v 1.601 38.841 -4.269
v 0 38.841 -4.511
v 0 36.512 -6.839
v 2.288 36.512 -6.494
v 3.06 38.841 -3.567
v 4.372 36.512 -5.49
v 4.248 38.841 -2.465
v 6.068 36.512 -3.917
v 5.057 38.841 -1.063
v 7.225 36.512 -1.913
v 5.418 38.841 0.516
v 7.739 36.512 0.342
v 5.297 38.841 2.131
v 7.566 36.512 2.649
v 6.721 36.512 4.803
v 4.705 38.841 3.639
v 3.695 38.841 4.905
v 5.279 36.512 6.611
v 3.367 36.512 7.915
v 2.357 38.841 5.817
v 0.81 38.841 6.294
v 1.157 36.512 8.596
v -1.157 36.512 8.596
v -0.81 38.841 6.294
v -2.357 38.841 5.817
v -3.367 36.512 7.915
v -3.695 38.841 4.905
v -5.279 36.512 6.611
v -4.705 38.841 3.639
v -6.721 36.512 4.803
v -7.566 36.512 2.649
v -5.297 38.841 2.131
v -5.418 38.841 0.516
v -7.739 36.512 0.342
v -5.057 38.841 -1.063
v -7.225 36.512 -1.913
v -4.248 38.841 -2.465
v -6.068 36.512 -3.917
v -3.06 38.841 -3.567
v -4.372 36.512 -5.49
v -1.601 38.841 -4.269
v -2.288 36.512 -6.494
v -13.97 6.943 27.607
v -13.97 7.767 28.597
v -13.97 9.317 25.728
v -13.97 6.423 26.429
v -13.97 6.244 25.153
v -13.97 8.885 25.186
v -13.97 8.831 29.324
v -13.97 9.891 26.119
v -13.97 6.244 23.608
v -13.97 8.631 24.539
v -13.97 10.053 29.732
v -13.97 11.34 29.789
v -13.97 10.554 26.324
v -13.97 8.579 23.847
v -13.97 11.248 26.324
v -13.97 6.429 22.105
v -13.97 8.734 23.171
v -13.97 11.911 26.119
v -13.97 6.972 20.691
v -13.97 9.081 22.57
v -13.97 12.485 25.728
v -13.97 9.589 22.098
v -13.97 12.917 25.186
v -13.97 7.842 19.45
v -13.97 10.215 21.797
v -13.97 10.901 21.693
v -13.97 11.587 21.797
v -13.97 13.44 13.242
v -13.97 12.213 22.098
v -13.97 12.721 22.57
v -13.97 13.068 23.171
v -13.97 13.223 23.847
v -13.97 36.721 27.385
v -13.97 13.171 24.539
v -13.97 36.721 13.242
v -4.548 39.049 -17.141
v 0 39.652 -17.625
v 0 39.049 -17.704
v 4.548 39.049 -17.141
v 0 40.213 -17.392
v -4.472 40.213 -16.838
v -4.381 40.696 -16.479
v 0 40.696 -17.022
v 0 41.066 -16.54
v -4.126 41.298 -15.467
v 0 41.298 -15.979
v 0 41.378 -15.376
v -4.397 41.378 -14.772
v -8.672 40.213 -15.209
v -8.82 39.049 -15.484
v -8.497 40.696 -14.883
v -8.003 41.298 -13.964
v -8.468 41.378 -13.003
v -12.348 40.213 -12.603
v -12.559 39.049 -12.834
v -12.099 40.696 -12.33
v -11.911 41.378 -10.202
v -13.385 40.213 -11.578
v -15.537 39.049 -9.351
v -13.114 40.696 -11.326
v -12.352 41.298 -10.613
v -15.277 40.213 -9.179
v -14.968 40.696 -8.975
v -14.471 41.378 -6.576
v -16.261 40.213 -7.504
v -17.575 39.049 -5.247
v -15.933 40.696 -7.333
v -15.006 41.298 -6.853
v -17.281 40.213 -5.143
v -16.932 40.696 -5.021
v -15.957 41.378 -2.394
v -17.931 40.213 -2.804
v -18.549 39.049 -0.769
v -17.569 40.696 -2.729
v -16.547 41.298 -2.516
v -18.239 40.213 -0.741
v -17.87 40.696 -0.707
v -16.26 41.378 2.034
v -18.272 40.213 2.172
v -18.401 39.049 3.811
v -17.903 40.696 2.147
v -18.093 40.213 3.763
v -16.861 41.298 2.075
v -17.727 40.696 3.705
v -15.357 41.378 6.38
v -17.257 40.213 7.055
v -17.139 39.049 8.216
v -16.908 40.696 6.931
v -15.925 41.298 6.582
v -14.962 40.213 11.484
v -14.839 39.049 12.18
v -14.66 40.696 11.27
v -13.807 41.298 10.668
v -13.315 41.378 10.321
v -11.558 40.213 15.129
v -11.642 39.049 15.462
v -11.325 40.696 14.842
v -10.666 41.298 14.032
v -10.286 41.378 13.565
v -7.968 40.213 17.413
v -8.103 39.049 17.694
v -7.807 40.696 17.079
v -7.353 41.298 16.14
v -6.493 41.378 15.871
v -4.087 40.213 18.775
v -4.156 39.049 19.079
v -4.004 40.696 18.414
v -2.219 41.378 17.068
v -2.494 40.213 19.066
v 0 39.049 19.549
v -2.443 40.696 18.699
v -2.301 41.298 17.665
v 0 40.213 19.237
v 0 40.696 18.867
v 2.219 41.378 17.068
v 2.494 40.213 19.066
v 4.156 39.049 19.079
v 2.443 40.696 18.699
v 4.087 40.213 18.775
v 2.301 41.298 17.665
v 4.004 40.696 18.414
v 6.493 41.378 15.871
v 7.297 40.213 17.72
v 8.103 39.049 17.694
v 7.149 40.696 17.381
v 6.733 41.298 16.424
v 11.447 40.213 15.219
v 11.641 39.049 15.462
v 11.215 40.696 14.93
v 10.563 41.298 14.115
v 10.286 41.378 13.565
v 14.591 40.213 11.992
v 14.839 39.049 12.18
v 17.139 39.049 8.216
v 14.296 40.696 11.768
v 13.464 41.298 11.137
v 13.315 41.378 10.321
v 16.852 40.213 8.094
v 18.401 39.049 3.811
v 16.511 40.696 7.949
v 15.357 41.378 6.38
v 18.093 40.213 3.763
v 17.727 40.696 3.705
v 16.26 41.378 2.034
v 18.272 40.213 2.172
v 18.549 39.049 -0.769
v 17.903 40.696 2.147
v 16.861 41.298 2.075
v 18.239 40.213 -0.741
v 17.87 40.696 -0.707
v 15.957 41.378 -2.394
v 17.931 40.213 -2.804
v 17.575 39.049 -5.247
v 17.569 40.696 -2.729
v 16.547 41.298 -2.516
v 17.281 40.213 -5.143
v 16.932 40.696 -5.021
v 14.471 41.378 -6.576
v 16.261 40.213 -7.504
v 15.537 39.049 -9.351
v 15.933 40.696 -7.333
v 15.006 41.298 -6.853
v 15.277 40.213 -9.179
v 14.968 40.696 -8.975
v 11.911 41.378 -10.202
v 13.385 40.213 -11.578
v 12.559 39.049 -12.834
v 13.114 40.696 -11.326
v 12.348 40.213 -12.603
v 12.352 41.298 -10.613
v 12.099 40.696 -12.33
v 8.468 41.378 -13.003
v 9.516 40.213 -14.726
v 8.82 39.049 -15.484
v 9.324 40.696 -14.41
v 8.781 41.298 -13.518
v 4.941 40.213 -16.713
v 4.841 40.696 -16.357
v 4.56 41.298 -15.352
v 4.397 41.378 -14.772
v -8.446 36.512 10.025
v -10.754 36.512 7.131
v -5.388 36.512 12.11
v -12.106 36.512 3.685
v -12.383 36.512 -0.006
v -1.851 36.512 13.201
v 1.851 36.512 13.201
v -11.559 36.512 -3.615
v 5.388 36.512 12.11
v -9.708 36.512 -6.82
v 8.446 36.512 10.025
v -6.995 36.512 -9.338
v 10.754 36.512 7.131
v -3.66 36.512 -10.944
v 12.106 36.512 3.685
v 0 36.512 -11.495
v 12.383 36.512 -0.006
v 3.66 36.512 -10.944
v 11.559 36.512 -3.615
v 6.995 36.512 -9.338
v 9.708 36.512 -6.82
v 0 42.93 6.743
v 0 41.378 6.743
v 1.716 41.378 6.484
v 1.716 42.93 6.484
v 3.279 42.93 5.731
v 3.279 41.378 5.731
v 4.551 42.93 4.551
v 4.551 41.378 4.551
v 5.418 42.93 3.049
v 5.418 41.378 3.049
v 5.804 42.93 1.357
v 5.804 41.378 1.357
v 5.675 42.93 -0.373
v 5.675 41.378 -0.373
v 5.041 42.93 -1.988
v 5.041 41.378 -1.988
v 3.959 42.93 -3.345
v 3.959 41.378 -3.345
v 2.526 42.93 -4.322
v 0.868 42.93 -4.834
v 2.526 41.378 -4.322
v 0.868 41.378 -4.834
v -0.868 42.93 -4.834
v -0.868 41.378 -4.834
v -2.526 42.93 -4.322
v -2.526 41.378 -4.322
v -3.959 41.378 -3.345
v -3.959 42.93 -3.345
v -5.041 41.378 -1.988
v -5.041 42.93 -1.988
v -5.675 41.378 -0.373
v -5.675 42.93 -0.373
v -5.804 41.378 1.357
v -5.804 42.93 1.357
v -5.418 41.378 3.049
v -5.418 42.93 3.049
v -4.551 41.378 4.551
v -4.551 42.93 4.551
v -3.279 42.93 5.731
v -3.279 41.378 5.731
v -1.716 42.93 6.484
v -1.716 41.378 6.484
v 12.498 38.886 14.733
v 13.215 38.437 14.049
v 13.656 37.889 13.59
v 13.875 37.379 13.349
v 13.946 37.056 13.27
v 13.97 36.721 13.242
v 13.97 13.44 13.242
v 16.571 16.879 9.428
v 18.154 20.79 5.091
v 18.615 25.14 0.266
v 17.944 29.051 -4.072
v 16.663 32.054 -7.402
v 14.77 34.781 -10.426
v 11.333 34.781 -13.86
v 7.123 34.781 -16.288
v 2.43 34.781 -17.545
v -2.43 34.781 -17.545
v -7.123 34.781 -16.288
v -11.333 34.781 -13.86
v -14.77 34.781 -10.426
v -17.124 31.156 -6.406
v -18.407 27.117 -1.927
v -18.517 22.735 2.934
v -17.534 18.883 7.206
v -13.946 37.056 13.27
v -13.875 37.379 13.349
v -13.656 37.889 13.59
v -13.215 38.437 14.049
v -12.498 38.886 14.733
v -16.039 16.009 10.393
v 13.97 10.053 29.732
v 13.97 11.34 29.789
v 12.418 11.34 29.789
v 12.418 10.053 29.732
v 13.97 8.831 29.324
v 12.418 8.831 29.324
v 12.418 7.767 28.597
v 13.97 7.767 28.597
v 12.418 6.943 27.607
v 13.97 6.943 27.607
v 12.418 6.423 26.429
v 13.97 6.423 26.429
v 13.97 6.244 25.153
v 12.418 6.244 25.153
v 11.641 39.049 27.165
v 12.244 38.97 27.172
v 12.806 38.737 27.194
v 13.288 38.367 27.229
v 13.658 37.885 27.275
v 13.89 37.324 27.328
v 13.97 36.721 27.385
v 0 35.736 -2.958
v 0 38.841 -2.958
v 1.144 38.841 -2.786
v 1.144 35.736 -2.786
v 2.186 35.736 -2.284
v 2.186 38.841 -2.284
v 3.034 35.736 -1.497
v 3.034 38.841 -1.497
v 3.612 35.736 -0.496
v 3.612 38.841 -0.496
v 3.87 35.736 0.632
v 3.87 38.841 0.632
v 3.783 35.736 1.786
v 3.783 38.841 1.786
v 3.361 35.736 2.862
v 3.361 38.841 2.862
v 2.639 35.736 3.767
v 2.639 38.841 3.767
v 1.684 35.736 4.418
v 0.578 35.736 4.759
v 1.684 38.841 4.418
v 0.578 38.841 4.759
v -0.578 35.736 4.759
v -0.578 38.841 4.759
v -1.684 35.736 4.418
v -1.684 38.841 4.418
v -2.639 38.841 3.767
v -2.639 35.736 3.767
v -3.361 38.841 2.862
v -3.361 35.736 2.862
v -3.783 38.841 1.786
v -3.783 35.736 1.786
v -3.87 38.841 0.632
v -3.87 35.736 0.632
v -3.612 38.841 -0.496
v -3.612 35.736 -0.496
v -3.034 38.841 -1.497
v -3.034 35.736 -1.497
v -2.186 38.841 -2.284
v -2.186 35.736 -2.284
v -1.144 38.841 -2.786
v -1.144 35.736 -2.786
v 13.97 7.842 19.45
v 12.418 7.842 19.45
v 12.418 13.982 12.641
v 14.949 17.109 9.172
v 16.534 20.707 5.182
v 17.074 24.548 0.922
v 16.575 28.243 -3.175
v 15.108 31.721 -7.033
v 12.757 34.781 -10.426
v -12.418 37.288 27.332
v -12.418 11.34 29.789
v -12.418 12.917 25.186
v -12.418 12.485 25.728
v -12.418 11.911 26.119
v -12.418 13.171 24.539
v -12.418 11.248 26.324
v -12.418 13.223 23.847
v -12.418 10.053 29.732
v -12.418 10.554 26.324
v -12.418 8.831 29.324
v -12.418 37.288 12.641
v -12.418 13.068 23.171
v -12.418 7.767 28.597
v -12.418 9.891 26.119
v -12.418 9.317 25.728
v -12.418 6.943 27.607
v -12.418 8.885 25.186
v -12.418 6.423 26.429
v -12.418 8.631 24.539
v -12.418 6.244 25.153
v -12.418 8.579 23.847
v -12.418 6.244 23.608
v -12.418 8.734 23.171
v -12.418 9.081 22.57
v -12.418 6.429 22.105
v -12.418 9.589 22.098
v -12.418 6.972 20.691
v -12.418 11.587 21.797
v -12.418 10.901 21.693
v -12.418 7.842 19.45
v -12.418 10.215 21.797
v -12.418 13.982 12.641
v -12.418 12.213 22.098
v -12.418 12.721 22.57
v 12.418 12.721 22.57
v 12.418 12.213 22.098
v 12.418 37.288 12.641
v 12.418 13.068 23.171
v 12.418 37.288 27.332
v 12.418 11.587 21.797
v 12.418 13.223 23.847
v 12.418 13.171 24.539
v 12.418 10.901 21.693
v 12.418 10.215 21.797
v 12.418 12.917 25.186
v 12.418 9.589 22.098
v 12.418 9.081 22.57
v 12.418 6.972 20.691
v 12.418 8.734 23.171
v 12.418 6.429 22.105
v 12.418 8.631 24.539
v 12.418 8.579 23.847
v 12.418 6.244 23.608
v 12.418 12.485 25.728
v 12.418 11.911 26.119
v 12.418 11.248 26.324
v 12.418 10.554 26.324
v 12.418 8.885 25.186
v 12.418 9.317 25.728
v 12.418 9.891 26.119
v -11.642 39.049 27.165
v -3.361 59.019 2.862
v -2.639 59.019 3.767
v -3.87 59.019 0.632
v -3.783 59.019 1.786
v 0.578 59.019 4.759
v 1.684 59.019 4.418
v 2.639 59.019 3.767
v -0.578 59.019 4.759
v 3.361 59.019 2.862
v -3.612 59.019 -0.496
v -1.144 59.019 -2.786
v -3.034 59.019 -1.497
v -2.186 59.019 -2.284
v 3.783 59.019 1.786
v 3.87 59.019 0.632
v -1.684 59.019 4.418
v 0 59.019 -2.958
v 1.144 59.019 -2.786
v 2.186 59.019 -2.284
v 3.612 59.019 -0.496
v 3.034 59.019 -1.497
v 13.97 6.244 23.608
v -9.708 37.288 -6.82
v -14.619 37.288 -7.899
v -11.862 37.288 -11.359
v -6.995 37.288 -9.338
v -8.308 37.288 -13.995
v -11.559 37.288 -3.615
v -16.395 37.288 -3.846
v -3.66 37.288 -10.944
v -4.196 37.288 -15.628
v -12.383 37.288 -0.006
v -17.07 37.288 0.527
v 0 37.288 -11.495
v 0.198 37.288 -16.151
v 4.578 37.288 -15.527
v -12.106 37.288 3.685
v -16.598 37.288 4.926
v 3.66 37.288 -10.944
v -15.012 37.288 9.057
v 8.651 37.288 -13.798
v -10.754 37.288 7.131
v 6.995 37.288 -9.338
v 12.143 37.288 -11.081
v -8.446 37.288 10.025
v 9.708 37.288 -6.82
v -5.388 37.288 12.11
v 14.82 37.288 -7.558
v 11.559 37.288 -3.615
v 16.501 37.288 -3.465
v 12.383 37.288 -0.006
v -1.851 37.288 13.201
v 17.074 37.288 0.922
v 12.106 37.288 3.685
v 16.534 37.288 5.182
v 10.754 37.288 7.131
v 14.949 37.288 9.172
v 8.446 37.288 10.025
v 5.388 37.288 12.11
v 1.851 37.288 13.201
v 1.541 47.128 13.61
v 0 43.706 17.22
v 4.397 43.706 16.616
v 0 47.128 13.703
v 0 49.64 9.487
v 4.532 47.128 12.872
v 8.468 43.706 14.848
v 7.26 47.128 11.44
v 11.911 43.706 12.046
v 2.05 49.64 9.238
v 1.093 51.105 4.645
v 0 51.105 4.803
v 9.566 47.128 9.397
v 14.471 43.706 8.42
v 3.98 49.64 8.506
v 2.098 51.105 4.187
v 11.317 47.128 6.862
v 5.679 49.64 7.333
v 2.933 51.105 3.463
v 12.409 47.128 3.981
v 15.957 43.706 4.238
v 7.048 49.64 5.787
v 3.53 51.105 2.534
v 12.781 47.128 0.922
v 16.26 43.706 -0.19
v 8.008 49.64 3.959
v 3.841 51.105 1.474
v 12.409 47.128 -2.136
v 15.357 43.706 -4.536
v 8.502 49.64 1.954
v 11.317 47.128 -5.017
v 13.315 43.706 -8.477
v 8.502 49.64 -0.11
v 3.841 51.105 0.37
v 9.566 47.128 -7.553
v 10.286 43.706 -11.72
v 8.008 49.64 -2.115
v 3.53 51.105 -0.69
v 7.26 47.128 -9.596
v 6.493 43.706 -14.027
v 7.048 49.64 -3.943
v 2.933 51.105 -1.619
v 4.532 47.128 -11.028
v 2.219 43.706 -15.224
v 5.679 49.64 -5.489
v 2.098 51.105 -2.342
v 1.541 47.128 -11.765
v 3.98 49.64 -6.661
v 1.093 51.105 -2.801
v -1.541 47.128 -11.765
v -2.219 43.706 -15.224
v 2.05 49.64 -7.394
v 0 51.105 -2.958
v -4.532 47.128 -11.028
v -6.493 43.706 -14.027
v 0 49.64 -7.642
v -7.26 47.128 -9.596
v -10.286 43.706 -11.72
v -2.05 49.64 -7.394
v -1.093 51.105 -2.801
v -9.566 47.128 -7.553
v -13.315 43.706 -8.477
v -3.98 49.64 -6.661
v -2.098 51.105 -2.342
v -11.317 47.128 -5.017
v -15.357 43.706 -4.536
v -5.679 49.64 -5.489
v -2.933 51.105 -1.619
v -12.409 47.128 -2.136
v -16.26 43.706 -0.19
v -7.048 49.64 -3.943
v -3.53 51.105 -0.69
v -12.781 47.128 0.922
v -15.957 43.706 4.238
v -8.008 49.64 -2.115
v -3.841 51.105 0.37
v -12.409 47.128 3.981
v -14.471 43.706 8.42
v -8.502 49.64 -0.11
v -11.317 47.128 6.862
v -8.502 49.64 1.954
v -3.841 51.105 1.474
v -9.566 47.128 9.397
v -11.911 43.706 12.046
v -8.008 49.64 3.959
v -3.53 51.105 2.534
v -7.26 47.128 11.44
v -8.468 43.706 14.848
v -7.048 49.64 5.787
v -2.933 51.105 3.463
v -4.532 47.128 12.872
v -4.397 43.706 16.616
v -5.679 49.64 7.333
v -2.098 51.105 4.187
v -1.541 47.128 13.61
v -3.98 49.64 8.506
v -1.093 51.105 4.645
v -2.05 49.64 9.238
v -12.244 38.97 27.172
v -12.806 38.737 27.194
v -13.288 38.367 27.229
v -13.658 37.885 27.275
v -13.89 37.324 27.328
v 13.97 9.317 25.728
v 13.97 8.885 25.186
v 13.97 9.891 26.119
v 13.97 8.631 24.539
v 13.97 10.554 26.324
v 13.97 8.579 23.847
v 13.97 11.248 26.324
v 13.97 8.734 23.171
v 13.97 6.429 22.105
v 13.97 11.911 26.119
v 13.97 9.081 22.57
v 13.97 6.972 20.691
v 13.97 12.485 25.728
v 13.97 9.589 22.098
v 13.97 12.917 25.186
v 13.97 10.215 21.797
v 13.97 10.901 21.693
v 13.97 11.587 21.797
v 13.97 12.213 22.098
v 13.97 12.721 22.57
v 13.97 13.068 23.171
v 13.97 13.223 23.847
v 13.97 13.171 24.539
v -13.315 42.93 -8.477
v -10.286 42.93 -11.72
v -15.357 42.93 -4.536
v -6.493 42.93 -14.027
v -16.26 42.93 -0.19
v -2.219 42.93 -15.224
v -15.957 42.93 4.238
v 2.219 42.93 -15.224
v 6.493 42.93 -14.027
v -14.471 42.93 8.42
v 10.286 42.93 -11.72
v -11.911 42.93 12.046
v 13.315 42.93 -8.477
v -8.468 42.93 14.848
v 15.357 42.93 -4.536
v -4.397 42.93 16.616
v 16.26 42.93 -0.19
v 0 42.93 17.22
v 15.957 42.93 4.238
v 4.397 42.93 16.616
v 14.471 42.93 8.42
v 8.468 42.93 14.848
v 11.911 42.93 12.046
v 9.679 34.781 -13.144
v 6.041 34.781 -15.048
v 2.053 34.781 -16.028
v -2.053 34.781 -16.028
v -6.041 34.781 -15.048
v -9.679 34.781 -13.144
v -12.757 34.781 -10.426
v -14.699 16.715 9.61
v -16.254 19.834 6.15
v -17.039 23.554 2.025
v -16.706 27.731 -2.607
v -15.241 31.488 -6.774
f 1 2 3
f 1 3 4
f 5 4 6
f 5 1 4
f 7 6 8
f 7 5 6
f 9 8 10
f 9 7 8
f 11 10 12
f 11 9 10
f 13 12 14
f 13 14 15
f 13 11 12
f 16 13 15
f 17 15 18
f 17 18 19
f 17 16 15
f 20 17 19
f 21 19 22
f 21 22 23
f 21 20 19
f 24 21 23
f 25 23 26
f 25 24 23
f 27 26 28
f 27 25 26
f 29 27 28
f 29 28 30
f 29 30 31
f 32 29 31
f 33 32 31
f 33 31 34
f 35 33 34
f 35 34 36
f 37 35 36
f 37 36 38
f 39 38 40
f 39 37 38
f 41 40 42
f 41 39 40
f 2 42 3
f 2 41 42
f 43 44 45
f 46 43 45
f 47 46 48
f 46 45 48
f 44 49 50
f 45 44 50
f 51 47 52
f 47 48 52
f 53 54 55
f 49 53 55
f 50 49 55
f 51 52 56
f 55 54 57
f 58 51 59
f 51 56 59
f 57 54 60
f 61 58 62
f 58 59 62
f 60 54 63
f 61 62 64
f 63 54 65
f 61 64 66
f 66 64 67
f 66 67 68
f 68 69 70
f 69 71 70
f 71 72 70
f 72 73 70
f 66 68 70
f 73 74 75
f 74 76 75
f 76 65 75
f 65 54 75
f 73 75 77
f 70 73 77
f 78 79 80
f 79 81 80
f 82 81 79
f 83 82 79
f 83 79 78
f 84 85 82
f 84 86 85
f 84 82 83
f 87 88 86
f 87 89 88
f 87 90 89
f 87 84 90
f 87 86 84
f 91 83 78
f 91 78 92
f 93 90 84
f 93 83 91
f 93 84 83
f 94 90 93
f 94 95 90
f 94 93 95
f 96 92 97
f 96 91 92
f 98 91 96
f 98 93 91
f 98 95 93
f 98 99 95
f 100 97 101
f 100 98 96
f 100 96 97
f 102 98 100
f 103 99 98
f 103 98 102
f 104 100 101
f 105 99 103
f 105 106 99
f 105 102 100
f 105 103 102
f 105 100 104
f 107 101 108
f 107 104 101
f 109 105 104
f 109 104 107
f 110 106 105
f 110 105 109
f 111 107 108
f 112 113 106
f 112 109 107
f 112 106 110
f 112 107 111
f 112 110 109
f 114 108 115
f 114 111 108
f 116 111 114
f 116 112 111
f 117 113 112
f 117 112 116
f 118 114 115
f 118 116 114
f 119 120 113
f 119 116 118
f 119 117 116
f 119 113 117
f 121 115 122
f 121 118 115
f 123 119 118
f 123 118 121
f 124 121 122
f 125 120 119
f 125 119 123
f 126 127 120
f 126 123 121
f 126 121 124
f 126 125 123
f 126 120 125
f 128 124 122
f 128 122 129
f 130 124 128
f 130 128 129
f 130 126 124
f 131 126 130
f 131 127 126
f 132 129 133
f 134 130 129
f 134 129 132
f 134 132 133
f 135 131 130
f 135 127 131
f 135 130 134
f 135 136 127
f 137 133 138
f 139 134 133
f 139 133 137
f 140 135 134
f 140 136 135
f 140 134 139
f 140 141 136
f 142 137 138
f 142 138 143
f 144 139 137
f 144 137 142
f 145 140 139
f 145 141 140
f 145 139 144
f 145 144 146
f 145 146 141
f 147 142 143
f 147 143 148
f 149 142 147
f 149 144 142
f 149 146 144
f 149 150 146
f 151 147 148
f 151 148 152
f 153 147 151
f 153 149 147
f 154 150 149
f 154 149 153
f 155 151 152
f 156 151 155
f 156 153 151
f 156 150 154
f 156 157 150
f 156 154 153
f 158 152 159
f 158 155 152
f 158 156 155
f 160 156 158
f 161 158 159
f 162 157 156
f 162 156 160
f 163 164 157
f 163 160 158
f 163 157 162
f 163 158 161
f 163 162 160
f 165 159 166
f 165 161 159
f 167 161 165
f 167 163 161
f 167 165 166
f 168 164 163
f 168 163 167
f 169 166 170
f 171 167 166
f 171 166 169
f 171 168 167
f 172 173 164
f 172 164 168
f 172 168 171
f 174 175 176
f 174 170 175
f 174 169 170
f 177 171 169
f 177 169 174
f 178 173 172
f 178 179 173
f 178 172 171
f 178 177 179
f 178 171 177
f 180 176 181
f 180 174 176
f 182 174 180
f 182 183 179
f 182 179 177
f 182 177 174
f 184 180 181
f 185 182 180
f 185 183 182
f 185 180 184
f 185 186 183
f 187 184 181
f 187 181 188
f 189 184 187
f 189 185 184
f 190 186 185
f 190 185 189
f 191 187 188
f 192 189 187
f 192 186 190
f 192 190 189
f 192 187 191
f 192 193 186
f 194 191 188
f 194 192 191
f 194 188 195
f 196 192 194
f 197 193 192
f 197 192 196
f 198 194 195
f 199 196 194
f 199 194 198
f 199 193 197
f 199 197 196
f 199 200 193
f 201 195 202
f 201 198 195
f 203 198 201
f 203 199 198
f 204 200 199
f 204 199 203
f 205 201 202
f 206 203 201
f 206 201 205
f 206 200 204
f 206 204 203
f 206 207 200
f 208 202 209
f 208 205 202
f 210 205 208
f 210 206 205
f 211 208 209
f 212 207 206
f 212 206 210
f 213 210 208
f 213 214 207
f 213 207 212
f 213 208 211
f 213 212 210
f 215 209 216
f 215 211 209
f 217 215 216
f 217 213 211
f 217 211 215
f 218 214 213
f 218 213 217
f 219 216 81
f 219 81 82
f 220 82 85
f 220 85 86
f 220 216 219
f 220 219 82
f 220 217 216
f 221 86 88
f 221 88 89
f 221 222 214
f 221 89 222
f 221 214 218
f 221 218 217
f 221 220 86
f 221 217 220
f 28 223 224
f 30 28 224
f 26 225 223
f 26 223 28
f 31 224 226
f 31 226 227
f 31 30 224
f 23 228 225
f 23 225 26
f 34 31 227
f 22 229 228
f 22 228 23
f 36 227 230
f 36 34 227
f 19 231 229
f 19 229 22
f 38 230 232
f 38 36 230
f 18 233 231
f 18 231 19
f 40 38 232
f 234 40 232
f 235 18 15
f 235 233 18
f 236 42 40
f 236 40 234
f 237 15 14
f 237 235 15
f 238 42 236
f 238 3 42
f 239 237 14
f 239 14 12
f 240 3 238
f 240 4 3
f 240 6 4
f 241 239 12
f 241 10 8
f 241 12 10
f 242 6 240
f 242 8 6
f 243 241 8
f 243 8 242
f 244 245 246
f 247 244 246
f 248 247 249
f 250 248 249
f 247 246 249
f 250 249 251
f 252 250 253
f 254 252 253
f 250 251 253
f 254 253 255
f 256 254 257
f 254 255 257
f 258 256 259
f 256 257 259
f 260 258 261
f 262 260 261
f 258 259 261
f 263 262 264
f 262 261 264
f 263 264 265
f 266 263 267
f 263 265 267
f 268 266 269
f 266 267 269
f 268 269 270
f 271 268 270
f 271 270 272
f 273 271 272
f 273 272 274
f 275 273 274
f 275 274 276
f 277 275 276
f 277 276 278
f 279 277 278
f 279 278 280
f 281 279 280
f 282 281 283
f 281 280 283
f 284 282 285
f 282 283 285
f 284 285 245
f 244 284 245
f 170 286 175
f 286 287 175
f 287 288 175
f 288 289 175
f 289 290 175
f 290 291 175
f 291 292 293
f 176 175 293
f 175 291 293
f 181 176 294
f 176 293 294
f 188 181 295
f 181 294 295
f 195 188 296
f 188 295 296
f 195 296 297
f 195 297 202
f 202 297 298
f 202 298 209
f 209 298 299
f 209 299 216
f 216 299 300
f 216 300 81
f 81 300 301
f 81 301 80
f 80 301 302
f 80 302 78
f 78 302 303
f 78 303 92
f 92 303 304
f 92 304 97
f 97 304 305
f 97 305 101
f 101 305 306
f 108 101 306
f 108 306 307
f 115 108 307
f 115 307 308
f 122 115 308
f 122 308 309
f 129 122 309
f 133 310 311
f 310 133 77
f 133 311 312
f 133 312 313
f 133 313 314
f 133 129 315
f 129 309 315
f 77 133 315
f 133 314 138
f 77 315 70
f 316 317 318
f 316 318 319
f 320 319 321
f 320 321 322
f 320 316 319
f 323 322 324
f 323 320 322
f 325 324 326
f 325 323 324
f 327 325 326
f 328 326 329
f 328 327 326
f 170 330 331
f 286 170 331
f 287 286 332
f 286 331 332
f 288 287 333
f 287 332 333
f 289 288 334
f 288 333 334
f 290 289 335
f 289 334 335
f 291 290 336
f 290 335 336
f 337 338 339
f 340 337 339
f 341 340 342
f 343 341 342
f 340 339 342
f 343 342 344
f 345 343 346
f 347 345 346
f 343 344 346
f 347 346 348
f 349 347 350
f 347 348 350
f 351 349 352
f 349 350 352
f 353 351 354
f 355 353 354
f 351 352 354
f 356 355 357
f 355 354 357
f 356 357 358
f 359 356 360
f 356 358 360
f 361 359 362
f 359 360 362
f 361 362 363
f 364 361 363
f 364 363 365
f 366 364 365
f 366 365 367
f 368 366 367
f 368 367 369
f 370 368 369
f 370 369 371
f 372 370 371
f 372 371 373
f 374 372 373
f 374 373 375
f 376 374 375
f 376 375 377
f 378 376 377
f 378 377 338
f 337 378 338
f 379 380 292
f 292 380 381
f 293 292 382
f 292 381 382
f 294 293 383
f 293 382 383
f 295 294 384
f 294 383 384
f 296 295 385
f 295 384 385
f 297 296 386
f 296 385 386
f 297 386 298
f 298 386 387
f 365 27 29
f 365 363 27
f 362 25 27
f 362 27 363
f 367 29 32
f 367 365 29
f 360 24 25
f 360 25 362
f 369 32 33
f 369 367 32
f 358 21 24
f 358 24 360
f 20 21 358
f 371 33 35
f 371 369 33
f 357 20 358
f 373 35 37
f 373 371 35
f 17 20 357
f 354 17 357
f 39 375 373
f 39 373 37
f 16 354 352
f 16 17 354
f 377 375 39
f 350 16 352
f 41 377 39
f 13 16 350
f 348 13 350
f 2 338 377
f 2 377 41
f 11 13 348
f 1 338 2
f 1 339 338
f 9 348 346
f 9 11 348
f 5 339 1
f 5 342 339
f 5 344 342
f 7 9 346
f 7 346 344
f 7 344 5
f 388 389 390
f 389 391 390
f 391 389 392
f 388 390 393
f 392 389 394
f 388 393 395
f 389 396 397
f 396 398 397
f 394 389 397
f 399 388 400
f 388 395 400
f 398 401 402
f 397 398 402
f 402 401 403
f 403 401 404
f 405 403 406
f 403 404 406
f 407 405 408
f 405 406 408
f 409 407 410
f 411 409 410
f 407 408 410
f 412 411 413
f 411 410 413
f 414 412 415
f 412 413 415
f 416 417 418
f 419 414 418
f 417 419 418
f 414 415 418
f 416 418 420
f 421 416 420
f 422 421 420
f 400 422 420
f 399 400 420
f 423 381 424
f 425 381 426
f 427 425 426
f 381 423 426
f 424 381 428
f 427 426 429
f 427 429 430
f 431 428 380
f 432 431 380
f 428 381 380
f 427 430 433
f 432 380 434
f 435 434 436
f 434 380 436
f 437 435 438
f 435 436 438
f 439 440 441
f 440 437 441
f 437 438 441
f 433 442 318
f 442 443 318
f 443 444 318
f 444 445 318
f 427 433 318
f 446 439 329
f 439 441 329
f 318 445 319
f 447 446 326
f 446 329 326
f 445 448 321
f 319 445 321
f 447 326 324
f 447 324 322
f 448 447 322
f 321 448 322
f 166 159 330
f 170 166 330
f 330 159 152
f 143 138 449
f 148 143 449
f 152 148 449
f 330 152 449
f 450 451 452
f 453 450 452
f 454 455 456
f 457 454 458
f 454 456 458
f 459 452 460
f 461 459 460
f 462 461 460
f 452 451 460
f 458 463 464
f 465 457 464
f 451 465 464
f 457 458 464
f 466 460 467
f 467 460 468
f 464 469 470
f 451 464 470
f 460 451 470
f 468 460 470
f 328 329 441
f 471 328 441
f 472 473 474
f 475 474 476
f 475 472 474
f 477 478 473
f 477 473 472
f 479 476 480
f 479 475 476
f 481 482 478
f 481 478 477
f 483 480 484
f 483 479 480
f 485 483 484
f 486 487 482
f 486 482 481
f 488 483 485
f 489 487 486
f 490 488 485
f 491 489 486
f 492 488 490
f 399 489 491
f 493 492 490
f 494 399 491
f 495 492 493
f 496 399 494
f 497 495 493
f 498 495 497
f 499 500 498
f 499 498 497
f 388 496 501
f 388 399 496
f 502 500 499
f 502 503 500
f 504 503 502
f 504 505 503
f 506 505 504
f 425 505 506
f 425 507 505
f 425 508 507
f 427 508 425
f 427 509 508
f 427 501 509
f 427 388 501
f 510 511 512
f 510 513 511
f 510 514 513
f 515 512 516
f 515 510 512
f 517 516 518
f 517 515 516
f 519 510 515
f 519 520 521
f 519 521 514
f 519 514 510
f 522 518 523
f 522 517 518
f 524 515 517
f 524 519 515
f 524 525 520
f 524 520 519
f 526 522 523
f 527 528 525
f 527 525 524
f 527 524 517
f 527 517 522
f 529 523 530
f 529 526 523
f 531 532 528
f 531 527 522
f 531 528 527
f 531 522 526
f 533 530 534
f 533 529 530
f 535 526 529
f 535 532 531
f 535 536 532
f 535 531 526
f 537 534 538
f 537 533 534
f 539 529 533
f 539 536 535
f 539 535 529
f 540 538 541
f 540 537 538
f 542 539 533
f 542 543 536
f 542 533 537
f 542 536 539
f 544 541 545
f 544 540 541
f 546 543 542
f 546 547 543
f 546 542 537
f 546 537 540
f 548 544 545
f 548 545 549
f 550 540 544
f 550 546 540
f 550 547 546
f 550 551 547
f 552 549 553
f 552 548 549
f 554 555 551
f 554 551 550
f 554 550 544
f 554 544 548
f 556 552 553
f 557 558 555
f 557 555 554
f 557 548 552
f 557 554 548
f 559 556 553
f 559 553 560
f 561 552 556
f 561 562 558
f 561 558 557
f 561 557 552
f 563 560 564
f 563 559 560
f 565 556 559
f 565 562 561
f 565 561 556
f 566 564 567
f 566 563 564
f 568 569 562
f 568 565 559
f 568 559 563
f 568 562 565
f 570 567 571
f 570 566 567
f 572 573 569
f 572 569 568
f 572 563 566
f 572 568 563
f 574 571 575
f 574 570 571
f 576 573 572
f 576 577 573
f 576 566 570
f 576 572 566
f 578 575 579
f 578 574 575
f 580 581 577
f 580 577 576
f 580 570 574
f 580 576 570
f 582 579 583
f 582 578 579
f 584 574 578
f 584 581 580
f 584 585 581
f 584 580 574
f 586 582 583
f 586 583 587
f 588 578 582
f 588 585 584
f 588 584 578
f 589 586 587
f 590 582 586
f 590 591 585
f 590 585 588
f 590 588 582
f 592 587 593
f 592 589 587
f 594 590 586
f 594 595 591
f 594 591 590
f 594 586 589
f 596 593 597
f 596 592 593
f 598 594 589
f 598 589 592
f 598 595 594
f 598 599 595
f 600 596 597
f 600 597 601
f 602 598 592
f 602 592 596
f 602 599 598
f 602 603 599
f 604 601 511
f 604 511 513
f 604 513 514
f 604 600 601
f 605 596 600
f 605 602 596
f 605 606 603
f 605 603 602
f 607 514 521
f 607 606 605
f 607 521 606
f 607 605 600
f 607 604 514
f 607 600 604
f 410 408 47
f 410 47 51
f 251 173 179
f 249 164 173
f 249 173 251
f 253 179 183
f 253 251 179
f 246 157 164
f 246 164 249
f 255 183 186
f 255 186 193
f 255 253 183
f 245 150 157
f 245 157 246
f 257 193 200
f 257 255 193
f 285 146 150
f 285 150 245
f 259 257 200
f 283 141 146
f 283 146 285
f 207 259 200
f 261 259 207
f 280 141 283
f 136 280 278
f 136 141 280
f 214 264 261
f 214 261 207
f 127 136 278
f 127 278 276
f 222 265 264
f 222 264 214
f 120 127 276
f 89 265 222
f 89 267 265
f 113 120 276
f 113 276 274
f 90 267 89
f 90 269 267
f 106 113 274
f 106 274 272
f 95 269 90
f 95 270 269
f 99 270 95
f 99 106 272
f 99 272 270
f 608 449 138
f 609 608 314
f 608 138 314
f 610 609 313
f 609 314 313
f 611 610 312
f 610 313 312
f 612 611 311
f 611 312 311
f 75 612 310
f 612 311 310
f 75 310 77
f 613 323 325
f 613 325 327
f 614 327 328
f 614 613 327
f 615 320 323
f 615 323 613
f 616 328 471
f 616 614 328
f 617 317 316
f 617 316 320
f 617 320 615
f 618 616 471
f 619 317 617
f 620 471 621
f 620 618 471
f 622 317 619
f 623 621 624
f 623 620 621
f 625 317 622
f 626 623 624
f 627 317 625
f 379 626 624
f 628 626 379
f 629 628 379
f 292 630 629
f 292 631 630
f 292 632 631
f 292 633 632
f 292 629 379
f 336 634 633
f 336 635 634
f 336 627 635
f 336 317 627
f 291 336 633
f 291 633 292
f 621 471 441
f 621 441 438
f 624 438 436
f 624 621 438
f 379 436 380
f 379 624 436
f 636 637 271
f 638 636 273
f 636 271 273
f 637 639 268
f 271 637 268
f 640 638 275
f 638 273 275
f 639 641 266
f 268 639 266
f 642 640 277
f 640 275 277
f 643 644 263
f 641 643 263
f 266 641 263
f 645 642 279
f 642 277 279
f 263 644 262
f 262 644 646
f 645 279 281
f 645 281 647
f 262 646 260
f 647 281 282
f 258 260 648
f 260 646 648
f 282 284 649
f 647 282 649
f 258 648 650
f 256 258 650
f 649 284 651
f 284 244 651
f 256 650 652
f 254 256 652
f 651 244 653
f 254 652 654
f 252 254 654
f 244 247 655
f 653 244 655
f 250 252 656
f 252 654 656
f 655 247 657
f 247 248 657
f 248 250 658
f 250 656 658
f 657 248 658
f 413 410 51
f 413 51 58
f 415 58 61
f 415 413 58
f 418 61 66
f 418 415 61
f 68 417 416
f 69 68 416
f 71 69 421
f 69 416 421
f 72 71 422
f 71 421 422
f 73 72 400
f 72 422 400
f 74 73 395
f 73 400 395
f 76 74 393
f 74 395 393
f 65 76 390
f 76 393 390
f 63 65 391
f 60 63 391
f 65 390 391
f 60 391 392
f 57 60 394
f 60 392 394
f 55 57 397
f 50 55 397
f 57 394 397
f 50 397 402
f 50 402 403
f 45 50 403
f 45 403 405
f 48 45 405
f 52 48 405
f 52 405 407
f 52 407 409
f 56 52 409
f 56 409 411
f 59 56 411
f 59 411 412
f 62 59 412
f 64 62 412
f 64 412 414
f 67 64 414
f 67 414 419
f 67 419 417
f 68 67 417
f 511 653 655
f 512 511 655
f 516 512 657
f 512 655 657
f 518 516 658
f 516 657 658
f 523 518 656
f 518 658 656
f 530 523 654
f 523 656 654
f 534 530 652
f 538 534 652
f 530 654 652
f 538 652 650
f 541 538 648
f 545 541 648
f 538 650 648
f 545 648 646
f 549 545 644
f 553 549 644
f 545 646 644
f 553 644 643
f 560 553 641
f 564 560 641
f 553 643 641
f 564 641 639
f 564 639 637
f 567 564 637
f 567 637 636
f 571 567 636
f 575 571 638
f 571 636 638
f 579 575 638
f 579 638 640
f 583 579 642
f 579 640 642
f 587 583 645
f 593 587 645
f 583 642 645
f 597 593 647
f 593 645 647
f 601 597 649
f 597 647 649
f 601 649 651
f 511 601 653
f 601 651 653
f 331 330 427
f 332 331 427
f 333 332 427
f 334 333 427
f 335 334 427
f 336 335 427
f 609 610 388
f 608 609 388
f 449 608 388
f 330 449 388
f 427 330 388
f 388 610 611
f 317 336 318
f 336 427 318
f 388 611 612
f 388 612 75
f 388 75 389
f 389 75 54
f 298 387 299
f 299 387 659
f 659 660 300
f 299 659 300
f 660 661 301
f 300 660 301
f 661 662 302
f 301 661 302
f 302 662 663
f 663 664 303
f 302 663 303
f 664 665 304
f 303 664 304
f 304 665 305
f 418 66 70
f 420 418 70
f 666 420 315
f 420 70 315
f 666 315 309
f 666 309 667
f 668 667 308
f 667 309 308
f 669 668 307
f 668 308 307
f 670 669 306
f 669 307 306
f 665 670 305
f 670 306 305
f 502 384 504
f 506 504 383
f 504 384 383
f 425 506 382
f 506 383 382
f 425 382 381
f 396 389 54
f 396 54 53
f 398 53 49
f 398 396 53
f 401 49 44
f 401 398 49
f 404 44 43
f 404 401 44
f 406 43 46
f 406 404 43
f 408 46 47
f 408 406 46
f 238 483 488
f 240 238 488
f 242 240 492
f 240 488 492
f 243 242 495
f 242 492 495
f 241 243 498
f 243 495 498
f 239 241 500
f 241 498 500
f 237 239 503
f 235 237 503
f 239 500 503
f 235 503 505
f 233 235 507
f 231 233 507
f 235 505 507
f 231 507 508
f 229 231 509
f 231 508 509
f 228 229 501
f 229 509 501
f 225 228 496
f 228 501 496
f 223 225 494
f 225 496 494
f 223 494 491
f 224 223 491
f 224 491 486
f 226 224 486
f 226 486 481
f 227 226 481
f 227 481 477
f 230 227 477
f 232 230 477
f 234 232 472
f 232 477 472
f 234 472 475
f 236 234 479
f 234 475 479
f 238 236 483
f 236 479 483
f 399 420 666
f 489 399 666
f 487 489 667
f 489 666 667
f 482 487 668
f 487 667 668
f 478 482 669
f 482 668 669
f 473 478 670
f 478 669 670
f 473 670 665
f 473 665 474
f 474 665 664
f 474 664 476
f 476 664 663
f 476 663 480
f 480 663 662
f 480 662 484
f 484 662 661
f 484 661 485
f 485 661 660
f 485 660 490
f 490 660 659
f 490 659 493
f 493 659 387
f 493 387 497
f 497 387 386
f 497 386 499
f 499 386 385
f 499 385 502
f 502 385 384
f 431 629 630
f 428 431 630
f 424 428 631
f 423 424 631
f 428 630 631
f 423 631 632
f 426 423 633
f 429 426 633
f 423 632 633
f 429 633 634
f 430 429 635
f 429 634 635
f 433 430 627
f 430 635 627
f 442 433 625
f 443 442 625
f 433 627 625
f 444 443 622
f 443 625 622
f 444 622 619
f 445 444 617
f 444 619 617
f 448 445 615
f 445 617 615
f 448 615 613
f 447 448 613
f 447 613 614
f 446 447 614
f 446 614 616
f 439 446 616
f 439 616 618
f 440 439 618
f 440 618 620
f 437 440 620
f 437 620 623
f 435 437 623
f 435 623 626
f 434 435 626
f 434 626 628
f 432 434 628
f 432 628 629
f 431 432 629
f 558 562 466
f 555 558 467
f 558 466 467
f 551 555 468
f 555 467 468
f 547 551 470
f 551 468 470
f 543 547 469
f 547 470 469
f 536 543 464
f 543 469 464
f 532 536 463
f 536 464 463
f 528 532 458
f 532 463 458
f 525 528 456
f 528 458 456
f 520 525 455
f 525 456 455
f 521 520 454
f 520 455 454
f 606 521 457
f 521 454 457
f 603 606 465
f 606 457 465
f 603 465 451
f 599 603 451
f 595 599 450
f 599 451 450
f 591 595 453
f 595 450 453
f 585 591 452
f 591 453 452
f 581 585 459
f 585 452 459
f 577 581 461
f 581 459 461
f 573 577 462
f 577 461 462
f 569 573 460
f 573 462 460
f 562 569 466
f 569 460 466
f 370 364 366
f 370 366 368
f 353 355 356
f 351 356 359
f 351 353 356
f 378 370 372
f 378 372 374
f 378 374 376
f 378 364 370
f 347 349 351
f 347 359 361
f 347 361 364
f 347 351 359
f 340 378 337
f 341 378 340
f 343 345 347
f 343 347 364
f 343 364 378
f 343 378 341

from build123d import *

# Parameters (mm, degrees)
SKETCH1_R                = 24
BOSS_EXTRUDE1_DEPTH      = 42
FILLET1_R                = 3
BOSS_EXTRUDE2_DEPTH      = 18
BOSS_EXTRUDE2_DEPTH_BACK = 18
CUT_EXTRUDE2_DEPTH       = 42
CUT_EXTRUDE3_DEPTH       = 62.400856059
CUT_EXTRUDE3_DEPTH_BACK  = 62.400856059
FILLET2_R                = 6
FILLET3_R                = 8
FILLET4_R                = 3
SKETCH6_W                = 32
SKETCH6_H                = 1.990473873
SKETCH6_H_2              = 40.942974084
CUT_EXTRUDE5_DEPTH       = 40
SKETCH7_R                = 16
BOSS_EXTRUDE3_DEPTH      = 1
SKETCH8_R                = 10
CUT_EXTRUDE6_DEPTH       = 3
CHAMFER1_SIZE            = 3
SKETCH9_R                = 5
BOSS_EXTRUDE4_DEPTH      = 4
CHAMFER2_SIZE            = 1
SKETCH10_R               = 3
CUT_EXTRUDE7_DEPTH       = 71.095779947
SKETCH11_R               = 7.5
BOSS_EXTRUDE5_DEPTH      = 2
SKETCH12_R               = 21
BOSS_EXTRUDE6_DEPTH      = 1
DOME1_FACE_RADIUS        = 21
DOME1_HEIGHT             = 10
BOSS_EXTRUDE7_START      = -30
SKETCH13_R               = 5
BOSS_EXTRUDE7_DEPTH      = 30
SCALE1_SCALE             = 0.7761


# Some blends are built 0.0001 mm under size
with BuildPart() as part:
    # Sketch1 → Boss-Extrude1 (new body)
    with BuildSketch(Plane(origin=(0, 0, 0), x_dir=(1, 0, 0), z_dir=(0, 1, 0))):
        with Locations(Location((0, 0, 0), (0, 0, 90))):
            Circle(SKETCH1_R)
    extrude(amount=BOSS_EXTRUDE1_DEPTH)

    # Fillet1
    fillet1_edges = [part.edges().sort_by_distance(p)[0] for p in [
        (0, 42, 24),
    ]]
    fillet(fillet1_edges, radius=FILLET1_R)

    # Sketch2 → Boss-Extrude2 (add, two sides: drawn at the far end of the back side and taken through both)
    with BuildSketch(Plane(origin=(0, 0, 0), x_dir=(0, 0, -1), z_dir=(1, 0, 0)).offset(-BOSS_EXTRUDE2_DEPTH_BACK)):
        Polygon((-24, 39), (-33.81365361, 39), (-37.816201771, -3.269008091), (-26.156604955, -3.269008091), (15.957162651, 34.668187521), (24, 34.668187521), (24, 39), align=None)
    extrude(amount=BOSS_EXTRUDE2_DEPTH + BOSS_EXTRUDE2_DEPTH_BACK)

    # Sketch4 → Cut-Extrude2 (cut)
    with BuildSketch(Plane.XZ):
        with BuildLine():
            Line((23.002581612, -9.203628547), (22.165135271, -9.203628547))
            ThreePointArc((22.165135271, -9.203628547), (0, -24), (-22.165135271, -9.203628547))
            Line((-22.165135271, -9.203628547), (-22.165135271, -25.095490922))
            Line((-22.165135271, -25.095490922), (23.002581612, -25.095490922))
            Line((23.002581612, -25.095490922), (23.002581612, -9.203628547))
        make_face()
    extrude(amount=-CUT_EXTRUDE2_DEPTH, mode=Mode.SUBTRACT)

    # Sketch5 → Cut-Extrude3 (cut, two sides: drawn at the far end of the back side and taken through both)
    with BuildSketch(Plane(origin=(0, 0, 0), x_dir=(0, 0, -1), z_dir=(1, 0, 0)).offset(-CUT_EXTRUDE3_DEPTH_BACK)):
        Polygon((-26.156604955, -3.269008091), (14.621999629, 33.5), (25.781931598, 33.5), (25.781931598, -3.269008091), align=None)
    extrude(amount=CUT_EXTRUDE3_DEPTH + CUT_EXTRUDE3_DEPTH_BACK, mode=Mode.SUBTRACT)

    # Fillet2
    fillet2_edges = [part.edges().sort_by_distance(p)[0] for p in [
        (0, -3.269008091, 37.816201771),
    ]]
    fillet(fillet2_edges, radius=FILLET2_R)

    # Fillet3
    fillet3_edges = [part.edges().sort_by_distance(p)[0] for p in [
        (0, -3.269008091, 26.156604955),
    ]]
    fillet(fillet3_edges, radius=FILLET3_R)

    # Fillet4
    # the kernel refuses this fillet: 3 mm, written as the material it takes off along each edge
    with BuildSketch(Plane(origin=(18, 39, 41.31365361), x_dir=(-1, 0, 0), z_dir=(0, 0, -1))) as fillet4_piece_1_section:
        with BuildLine():
            CenterArc((FILLET4_R, -FILLET4_R), FILLET4_R, 90, 90)
            Line((0, -FILLET4_R), (0, 0))
            Line((0, 0), (FILLET4_R, 0))
        make_face()
    fillet4_piece_1 = extrude(amount=32.939145744, mode=Mode.PRIVATE)
    fillet4_piece_1 = fillet4_piece_1 - Plane(origin=(0, 38.317129028, 0), x_dir=(0, 0, -1), z_dir=(0, -1, 0)) * Cylinder(24, 78, mode=Mode.PRIVATE)
    add(fillet4_piece_1, mode=Mode.SUBTRACT)
    with BuildSketch(Plane(origin=(-18, 39, 8.374507866), x_dir=(0, -1, 0), z_dir=(0, 0, 1))) as fillet4_piece_2_section:
        with BuildLine():
            CenterArc((FILLET4_R, FILLET4_R), FILLET4_R, 180, 90)
            Line((0, FILLET4_R), (0, 0))
            Line((0, 0), (FILLET4_R, 0))
        make_face()
    fillet4_piece_2 = extrude(amount=32.939145744, mode=Mode.PRIVATE)
    fillet4_piece_2 = fillet4_piece_2 - Plane(origin=(0, 38.317126887, 0), x_dir=(0, 0, -1), z_dir=(0, -1, 0)) * Cylinder(24, 78, mode=Mode.PRIVATE)
    add(fillet4_piece_2, mode=Mode.SUBTRACT)

    # Sketch6 → Cut-Extrude5 (cut)
    with BuildSketch(Plane.XZ.offset(3.269008091)):
        with BuildLine():
            ThreePointArc((16, 15.099668871), (0, 22), (-16, 15.099668871))
            Line((-16, 15.099668871), (-16, 2.278234246))
            Line((-16, 2.278234246), (16, 2.278234246))
            Line((16, 2.278234246), (16, 15.099668871))
        make_face()
        with BuildLine():
            Line((-16, 2.278234246), (-16, 15.099668871))
            ThreePointArc((-16, 15.099668871), (-8.124038405, -20.4450483), (22, 0))
            ThreePointArc((22, 0), (20.4450483, 8.124038405), (16, 15.099668871))
            Line((16, 15.099668871), (16, 2.278234246))
            Line((16, 2.278234246), (-16, 2.278234246))
        make_face()
        with Locations((0, 30.225971395)):
            Rectangle(SKETCH6_W, SKETCH6_H)
        with Locations((0, 51.692695373)):
            Rectangle(SKETCH6_W, SKETCH6_H_2)
        with BuildLine():
            Line((16, 29.230734458), (-16, 29.230734458))
            Line((-16, 29.230734458), (-16, 15.099668871))
            ThreePointArc((-16, 15.099668871), (0, 22), (16, 15.099668871))
            Line((16, 15.099668871), (16, 29.230734458))
        make_face()
    extrude(amount=-CUT_EXTRUDE5_DEPTH, mode=Mode.SUBTRACT)

    # Sketch7 → Boss-Extrude3 (add)
    with BuildSketch(Plane.XZ.offset(-36.730991909)):
        with Locations(Location((0, 0, 0), (0, 0, 270))):
            Circle(SKETCH7_R)
    extrude(amount=BOSS_EXTRUDE3_DEPTH)

    # Sketch8 → Cut-Extrude6 (cut)
    with BuildSketch(Plane.XZ.offset(-35.730991909)):
        with Locations(Location((0, 0, 0), (0, 0, 270))):
            Circle(SKETCH8_R)
    extrude(amount=-CUT_EXTRUDE6_DEPTH, mode=Mode.SUBTRACT)

    # Chamfer1
    chamfer1_edges = [part.edges().sort_by_distance(p)[0] for p in [
        (0, 38.730991909, 10),
    ]]
    chamfer(chamfer1_edges, length=CHAMFER1_SIZE - 0.0001)  # a hair under: the kernel refuses the full size

    # Sketch9 → Boss-Extrude4 (add)
    with BuildSketch(Plane.XZ.offset(-38.730991909)):
        with Locations(Location((0, 0, 0), (0, 0, 270))):
            Circle(SKETCH9_R)
    extrude(amount=BOSS_EXTRUDE4_DEPTH)

    # Chamfer2
    chamfer2_edges = [part.edges().sort_by_distance(p)[0] for p in [
        (0, 34.730991909, 5),
    ]]
    chamfer(chamfer2_edges, length=CHAMFER2_SIZE)

    # Sketch10 → Cut-Extrude7 (cut, through all)
    with BuildSketch(Plane(origin=(18, 0, 0), x_dir=(0, 0, -1), z_dir=(1, 0, 0))):
        with Locations((-29.763213514, 2.730991909)):
            Circle(SKETCH10_R)
    extrude(amount=-CUT_EXTRUDE7_DEPTH, mode=Mode.SUBTRACT)

    # Sketch11 → Boss-Extrude5 (add)
    with BuildSketch(Plane(origin=(0, 42, 0), x_dir=(1, 0, 0), z_dir=(0, 1, 0))):
        with Locations(Location((0, 0, 0), (0, 0, 270))):
            Circle(SKETCH11_R)
    extrude(amount=BOSS_EXTRUDE5_DEPTH)

    # Sketch12 → Boss-Extrude6 (add)
    with BuildSketch(Plane(origin=(0, 44, 0), x_dir=(1, 0, 0), z_dir=(0, 1, 0))):
        with Locations(Location((0, 0, 0), (0, 0, 270))):
            Circle(SKETCH12_R)
    extrude(amount=BOSS_EXTRUDE6_DEPTH)

    # Dome1: a dome of height H over a round flat face of radius A is a cap of a sphere of radius (A * A + H * H) / (2 * H)
    dome1_r = (DOME1_FACE_RADIUS * DOME1_FACE_RADIUS + DOME1_HEIGHT * DOME1_HEIGHT) / (2 * DOME1_HEIGHT)
    dome1_base = Plane((0, 45, 0), z_dir=(0, 1, 0))
    with Locations(dome1_base.offset(DOME1_HEIGHT - dome1_r)):
        dome1_ball = Sphere(dome1_r, mode=Mode.PRIVATE)
    add(split(dome1_ball, bisect_by=dome1_base, keep=Keep.TOP, mode=Mode.PRIVATE))

    # Sketch13 → Boss-Extrude7 (add)
    with BuildSketch(Plane.XZ.offset(-34.730991909).offset(BOSS_EXTRUDE7_START)):
        with Locations(Location((0, 0, 0), (0, 0, 270))):
            Circle(SKETCH13_R)
    extrude(amount=BOSS_EXTRUDE7_DEPTH)


with BuildPart() as part_1:
    # Scale1: scaled about (-4.3e-08, 39.220241586, 4.118564184)
    add(part.part.scale(SCALE1_SCALE).moved(Location((-1e-08, 8.781412091, 0.922146521))))


solid = part_1.part
